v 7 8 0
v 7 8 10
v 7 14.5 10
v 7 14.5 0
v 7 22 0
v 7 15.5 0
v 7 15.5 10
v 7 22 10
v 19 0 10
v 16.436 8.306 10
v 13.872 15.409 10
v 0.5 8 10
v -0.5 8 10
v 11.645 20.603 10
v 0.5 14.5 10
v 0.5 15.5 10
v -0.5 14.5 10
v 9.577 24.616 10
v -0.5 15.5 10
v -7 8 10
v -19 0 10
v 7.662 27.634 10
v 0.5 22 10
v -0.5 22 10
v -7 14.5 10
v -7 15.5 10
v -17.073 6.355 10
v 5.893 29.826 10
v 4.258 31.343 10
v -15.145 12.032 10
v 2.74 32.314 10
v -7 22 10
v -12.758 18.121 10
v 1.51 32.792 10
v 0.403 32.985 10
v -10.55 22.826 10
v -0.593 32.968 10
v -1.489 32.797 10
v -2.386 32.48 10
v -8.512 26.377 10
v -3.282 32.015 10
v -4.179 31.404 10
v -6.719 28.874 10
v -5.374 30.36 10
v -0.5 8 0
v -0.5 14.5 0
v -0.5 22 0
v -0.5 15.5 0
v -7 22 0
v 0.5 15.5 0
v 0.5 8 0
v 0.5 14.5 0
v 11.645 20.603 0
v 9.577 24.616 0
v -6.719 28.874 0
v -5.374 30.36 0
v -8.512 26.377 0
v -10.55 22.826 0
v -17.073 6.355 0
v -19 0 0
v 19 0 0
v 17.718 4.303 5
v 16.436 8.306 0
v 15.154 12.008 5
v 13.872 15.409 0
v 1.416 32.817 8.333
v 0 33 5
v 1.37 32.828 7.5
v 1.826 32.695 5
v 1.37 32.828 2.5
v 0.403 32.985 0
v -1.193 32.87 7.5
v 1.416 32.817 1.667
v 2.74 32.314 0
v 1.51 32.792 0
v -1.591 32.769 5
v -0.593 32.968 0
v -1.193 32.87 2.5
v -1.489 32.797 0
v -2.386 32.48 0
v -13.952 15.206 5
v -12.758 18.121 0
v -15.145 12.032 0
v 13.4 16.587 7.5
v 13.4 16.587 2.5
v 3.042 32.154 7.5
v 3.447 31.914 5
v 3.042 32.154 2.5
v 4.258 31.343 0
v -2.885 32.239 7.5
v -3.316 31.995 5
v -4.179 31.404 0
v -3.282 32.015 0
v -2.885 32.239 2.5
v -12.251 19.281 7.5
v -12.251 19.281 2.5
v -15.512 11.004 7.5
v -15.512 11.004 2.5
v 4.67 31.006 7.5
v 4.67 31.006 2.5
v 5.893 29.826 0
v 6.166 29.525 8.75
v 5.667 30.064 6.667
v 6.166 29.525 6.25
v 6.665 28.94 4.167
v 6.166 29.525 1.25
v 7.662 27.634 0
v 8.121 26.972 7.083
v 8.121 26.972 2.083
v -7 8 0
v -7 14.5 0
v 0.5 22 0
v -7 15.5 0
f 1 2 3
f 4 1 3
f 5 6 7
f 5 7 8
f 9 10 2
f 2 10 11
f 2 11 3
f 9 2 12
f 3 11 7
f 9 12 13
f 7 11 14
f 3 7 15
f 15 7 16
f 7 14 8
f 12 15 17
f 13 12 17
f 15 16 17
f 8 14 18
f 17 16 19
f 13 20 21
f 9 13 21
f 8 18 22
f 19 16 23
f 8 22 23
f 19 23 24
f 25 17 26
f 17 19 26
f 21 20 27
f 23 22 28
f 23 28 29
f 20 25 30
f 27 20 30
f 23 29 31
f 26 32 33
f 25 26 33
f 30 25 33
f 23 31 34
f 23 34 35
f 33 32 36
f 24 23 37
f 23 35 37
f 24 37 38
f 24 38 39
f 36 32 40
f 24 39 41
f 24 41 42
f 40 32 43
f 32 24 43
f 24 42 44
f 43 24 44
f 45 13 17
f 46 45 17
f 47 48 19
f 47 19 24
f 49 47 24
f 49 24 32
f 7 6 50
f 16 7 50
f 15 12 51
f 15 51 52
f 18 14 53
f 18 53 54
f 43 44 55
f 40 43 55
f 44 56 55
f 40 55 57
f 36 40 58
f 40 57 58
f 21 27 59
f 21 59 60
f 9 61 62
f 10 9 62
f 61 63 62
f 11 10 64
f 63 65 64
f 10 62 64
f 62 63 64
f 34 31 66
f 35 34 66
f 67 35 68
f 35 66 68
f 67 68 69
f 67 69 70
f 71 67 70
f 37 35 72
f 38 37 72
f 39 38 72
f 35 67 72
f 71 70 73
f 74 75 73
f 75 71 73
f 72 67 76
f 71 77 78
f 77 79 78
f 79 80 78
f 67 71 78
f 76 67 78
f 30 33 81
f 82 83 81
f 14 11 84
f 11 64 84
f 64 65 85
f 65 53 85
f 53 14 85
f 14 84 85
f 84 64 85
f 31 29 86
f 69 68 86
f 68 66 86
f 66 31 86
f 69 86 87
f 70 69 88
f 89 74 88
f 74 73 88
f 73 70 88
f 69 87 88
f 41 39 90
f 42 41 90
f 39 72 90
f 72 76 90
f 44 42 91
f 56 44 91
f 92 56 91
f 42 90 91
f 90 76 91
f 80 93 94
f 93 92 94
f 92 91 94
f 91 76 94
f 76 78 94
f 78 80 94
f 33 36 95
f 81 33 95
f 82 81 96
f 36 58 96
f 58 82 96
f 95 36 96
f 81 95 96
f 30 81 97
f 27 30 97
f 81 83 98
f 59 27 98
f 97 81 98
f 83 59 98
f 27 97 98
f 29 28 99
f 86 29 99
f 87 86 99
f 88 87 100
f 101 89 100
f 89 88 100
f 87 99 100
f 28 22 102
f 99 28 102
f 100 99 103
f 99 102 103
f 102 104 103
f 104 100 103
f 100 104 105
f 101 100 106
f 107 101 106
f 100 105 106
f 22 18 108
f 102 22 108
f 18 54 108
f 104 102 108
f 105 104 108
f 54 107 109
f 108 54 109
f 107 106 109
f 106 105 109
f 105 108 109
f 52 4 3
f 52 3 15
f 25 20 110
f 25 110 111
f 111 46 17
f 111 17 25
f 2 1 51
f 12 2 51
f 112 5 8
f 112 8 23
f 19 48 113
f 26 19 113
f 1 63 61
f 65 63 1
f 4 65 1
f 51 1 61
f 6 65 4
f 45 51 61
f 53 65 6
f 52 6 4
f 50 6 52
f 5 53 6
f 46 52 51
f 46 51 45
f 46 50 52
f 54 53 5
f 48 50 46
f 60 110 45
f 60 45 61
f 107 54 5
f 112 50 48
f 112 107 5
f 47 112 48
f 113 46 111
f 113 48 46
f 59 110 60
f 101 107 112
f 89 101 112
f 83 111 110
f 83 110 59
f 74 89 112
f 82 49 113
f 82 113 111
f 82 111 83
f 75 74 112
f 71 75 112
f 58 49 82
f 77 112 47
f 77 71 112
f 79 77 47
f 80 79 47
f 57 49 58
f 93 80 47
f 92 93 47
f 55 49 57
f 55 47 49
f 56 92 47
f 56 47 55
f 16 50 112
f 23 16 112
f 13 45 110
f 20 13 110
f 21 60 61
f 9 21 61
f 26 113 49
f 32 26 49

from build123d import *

# Parameters (mm, degrees)
EXTRUDE_1_DEPTH     = 10
SKETCH_2_W          = 6.5
SKETCH_2_H          = 6.5
CUT_EXTRUDE_1_DEPTH = 10


with BuildPart() as part:
    # 草图1 → 凸台-拉伸1 (new body)
    with BuildSketch(Plane.XY):
        with BuildLine():
            add(Edge.make_bspline(
                [(-19, 0), (-9.5, 33), (0, 33)],
                knots=[0, 0, 0, 0.5, 0.5, 0.5], degree=2))
            Line((-19, 0), (0, 0))
            Line((0, 0), (0, 33))
        make_face()
        with BuildLine():
            Line((0, 33), (0, 0))
            Line((0, 0), (19, 0))
            add(Edge.make_bspline(
                [(0, 33), (9.5, 33), (19, 0)],
                knots=[0.5, 0.5, 0.5, 1, 1, 1], degree=2))
        make_face()
    extrude(amount=EXTRUDE_1_DEPTH)

    # 草图2 → 切除-拉伸1 (cut)
    with BuildSketch(Plane(origin=(0, 0, 0), x_dir=(-1, 0, 0), z_dir=(0, 0, -1))):
        with Locations((-3.75, 18.75)):
            Rectangle(SKETCH_2_W, SKETCH_2_H)
        with Locations((-3.75, 11.25)):
            Rectangle(SKETCH_2_W, SKETCH_2_H)
        with Locations((3.75, 11.25)):
            Rectangle(SKETCH_2_W, SKETCH_2_H)
        with Locations((3.75, 18.75)):
            Rectangle(SKETCH_2_W, SKETCH_2_H)
    extrude(amount=-CUT_EXTRUDE_1_DEPTH, mode=Mode.SUBTRACT)


solid = part.part
